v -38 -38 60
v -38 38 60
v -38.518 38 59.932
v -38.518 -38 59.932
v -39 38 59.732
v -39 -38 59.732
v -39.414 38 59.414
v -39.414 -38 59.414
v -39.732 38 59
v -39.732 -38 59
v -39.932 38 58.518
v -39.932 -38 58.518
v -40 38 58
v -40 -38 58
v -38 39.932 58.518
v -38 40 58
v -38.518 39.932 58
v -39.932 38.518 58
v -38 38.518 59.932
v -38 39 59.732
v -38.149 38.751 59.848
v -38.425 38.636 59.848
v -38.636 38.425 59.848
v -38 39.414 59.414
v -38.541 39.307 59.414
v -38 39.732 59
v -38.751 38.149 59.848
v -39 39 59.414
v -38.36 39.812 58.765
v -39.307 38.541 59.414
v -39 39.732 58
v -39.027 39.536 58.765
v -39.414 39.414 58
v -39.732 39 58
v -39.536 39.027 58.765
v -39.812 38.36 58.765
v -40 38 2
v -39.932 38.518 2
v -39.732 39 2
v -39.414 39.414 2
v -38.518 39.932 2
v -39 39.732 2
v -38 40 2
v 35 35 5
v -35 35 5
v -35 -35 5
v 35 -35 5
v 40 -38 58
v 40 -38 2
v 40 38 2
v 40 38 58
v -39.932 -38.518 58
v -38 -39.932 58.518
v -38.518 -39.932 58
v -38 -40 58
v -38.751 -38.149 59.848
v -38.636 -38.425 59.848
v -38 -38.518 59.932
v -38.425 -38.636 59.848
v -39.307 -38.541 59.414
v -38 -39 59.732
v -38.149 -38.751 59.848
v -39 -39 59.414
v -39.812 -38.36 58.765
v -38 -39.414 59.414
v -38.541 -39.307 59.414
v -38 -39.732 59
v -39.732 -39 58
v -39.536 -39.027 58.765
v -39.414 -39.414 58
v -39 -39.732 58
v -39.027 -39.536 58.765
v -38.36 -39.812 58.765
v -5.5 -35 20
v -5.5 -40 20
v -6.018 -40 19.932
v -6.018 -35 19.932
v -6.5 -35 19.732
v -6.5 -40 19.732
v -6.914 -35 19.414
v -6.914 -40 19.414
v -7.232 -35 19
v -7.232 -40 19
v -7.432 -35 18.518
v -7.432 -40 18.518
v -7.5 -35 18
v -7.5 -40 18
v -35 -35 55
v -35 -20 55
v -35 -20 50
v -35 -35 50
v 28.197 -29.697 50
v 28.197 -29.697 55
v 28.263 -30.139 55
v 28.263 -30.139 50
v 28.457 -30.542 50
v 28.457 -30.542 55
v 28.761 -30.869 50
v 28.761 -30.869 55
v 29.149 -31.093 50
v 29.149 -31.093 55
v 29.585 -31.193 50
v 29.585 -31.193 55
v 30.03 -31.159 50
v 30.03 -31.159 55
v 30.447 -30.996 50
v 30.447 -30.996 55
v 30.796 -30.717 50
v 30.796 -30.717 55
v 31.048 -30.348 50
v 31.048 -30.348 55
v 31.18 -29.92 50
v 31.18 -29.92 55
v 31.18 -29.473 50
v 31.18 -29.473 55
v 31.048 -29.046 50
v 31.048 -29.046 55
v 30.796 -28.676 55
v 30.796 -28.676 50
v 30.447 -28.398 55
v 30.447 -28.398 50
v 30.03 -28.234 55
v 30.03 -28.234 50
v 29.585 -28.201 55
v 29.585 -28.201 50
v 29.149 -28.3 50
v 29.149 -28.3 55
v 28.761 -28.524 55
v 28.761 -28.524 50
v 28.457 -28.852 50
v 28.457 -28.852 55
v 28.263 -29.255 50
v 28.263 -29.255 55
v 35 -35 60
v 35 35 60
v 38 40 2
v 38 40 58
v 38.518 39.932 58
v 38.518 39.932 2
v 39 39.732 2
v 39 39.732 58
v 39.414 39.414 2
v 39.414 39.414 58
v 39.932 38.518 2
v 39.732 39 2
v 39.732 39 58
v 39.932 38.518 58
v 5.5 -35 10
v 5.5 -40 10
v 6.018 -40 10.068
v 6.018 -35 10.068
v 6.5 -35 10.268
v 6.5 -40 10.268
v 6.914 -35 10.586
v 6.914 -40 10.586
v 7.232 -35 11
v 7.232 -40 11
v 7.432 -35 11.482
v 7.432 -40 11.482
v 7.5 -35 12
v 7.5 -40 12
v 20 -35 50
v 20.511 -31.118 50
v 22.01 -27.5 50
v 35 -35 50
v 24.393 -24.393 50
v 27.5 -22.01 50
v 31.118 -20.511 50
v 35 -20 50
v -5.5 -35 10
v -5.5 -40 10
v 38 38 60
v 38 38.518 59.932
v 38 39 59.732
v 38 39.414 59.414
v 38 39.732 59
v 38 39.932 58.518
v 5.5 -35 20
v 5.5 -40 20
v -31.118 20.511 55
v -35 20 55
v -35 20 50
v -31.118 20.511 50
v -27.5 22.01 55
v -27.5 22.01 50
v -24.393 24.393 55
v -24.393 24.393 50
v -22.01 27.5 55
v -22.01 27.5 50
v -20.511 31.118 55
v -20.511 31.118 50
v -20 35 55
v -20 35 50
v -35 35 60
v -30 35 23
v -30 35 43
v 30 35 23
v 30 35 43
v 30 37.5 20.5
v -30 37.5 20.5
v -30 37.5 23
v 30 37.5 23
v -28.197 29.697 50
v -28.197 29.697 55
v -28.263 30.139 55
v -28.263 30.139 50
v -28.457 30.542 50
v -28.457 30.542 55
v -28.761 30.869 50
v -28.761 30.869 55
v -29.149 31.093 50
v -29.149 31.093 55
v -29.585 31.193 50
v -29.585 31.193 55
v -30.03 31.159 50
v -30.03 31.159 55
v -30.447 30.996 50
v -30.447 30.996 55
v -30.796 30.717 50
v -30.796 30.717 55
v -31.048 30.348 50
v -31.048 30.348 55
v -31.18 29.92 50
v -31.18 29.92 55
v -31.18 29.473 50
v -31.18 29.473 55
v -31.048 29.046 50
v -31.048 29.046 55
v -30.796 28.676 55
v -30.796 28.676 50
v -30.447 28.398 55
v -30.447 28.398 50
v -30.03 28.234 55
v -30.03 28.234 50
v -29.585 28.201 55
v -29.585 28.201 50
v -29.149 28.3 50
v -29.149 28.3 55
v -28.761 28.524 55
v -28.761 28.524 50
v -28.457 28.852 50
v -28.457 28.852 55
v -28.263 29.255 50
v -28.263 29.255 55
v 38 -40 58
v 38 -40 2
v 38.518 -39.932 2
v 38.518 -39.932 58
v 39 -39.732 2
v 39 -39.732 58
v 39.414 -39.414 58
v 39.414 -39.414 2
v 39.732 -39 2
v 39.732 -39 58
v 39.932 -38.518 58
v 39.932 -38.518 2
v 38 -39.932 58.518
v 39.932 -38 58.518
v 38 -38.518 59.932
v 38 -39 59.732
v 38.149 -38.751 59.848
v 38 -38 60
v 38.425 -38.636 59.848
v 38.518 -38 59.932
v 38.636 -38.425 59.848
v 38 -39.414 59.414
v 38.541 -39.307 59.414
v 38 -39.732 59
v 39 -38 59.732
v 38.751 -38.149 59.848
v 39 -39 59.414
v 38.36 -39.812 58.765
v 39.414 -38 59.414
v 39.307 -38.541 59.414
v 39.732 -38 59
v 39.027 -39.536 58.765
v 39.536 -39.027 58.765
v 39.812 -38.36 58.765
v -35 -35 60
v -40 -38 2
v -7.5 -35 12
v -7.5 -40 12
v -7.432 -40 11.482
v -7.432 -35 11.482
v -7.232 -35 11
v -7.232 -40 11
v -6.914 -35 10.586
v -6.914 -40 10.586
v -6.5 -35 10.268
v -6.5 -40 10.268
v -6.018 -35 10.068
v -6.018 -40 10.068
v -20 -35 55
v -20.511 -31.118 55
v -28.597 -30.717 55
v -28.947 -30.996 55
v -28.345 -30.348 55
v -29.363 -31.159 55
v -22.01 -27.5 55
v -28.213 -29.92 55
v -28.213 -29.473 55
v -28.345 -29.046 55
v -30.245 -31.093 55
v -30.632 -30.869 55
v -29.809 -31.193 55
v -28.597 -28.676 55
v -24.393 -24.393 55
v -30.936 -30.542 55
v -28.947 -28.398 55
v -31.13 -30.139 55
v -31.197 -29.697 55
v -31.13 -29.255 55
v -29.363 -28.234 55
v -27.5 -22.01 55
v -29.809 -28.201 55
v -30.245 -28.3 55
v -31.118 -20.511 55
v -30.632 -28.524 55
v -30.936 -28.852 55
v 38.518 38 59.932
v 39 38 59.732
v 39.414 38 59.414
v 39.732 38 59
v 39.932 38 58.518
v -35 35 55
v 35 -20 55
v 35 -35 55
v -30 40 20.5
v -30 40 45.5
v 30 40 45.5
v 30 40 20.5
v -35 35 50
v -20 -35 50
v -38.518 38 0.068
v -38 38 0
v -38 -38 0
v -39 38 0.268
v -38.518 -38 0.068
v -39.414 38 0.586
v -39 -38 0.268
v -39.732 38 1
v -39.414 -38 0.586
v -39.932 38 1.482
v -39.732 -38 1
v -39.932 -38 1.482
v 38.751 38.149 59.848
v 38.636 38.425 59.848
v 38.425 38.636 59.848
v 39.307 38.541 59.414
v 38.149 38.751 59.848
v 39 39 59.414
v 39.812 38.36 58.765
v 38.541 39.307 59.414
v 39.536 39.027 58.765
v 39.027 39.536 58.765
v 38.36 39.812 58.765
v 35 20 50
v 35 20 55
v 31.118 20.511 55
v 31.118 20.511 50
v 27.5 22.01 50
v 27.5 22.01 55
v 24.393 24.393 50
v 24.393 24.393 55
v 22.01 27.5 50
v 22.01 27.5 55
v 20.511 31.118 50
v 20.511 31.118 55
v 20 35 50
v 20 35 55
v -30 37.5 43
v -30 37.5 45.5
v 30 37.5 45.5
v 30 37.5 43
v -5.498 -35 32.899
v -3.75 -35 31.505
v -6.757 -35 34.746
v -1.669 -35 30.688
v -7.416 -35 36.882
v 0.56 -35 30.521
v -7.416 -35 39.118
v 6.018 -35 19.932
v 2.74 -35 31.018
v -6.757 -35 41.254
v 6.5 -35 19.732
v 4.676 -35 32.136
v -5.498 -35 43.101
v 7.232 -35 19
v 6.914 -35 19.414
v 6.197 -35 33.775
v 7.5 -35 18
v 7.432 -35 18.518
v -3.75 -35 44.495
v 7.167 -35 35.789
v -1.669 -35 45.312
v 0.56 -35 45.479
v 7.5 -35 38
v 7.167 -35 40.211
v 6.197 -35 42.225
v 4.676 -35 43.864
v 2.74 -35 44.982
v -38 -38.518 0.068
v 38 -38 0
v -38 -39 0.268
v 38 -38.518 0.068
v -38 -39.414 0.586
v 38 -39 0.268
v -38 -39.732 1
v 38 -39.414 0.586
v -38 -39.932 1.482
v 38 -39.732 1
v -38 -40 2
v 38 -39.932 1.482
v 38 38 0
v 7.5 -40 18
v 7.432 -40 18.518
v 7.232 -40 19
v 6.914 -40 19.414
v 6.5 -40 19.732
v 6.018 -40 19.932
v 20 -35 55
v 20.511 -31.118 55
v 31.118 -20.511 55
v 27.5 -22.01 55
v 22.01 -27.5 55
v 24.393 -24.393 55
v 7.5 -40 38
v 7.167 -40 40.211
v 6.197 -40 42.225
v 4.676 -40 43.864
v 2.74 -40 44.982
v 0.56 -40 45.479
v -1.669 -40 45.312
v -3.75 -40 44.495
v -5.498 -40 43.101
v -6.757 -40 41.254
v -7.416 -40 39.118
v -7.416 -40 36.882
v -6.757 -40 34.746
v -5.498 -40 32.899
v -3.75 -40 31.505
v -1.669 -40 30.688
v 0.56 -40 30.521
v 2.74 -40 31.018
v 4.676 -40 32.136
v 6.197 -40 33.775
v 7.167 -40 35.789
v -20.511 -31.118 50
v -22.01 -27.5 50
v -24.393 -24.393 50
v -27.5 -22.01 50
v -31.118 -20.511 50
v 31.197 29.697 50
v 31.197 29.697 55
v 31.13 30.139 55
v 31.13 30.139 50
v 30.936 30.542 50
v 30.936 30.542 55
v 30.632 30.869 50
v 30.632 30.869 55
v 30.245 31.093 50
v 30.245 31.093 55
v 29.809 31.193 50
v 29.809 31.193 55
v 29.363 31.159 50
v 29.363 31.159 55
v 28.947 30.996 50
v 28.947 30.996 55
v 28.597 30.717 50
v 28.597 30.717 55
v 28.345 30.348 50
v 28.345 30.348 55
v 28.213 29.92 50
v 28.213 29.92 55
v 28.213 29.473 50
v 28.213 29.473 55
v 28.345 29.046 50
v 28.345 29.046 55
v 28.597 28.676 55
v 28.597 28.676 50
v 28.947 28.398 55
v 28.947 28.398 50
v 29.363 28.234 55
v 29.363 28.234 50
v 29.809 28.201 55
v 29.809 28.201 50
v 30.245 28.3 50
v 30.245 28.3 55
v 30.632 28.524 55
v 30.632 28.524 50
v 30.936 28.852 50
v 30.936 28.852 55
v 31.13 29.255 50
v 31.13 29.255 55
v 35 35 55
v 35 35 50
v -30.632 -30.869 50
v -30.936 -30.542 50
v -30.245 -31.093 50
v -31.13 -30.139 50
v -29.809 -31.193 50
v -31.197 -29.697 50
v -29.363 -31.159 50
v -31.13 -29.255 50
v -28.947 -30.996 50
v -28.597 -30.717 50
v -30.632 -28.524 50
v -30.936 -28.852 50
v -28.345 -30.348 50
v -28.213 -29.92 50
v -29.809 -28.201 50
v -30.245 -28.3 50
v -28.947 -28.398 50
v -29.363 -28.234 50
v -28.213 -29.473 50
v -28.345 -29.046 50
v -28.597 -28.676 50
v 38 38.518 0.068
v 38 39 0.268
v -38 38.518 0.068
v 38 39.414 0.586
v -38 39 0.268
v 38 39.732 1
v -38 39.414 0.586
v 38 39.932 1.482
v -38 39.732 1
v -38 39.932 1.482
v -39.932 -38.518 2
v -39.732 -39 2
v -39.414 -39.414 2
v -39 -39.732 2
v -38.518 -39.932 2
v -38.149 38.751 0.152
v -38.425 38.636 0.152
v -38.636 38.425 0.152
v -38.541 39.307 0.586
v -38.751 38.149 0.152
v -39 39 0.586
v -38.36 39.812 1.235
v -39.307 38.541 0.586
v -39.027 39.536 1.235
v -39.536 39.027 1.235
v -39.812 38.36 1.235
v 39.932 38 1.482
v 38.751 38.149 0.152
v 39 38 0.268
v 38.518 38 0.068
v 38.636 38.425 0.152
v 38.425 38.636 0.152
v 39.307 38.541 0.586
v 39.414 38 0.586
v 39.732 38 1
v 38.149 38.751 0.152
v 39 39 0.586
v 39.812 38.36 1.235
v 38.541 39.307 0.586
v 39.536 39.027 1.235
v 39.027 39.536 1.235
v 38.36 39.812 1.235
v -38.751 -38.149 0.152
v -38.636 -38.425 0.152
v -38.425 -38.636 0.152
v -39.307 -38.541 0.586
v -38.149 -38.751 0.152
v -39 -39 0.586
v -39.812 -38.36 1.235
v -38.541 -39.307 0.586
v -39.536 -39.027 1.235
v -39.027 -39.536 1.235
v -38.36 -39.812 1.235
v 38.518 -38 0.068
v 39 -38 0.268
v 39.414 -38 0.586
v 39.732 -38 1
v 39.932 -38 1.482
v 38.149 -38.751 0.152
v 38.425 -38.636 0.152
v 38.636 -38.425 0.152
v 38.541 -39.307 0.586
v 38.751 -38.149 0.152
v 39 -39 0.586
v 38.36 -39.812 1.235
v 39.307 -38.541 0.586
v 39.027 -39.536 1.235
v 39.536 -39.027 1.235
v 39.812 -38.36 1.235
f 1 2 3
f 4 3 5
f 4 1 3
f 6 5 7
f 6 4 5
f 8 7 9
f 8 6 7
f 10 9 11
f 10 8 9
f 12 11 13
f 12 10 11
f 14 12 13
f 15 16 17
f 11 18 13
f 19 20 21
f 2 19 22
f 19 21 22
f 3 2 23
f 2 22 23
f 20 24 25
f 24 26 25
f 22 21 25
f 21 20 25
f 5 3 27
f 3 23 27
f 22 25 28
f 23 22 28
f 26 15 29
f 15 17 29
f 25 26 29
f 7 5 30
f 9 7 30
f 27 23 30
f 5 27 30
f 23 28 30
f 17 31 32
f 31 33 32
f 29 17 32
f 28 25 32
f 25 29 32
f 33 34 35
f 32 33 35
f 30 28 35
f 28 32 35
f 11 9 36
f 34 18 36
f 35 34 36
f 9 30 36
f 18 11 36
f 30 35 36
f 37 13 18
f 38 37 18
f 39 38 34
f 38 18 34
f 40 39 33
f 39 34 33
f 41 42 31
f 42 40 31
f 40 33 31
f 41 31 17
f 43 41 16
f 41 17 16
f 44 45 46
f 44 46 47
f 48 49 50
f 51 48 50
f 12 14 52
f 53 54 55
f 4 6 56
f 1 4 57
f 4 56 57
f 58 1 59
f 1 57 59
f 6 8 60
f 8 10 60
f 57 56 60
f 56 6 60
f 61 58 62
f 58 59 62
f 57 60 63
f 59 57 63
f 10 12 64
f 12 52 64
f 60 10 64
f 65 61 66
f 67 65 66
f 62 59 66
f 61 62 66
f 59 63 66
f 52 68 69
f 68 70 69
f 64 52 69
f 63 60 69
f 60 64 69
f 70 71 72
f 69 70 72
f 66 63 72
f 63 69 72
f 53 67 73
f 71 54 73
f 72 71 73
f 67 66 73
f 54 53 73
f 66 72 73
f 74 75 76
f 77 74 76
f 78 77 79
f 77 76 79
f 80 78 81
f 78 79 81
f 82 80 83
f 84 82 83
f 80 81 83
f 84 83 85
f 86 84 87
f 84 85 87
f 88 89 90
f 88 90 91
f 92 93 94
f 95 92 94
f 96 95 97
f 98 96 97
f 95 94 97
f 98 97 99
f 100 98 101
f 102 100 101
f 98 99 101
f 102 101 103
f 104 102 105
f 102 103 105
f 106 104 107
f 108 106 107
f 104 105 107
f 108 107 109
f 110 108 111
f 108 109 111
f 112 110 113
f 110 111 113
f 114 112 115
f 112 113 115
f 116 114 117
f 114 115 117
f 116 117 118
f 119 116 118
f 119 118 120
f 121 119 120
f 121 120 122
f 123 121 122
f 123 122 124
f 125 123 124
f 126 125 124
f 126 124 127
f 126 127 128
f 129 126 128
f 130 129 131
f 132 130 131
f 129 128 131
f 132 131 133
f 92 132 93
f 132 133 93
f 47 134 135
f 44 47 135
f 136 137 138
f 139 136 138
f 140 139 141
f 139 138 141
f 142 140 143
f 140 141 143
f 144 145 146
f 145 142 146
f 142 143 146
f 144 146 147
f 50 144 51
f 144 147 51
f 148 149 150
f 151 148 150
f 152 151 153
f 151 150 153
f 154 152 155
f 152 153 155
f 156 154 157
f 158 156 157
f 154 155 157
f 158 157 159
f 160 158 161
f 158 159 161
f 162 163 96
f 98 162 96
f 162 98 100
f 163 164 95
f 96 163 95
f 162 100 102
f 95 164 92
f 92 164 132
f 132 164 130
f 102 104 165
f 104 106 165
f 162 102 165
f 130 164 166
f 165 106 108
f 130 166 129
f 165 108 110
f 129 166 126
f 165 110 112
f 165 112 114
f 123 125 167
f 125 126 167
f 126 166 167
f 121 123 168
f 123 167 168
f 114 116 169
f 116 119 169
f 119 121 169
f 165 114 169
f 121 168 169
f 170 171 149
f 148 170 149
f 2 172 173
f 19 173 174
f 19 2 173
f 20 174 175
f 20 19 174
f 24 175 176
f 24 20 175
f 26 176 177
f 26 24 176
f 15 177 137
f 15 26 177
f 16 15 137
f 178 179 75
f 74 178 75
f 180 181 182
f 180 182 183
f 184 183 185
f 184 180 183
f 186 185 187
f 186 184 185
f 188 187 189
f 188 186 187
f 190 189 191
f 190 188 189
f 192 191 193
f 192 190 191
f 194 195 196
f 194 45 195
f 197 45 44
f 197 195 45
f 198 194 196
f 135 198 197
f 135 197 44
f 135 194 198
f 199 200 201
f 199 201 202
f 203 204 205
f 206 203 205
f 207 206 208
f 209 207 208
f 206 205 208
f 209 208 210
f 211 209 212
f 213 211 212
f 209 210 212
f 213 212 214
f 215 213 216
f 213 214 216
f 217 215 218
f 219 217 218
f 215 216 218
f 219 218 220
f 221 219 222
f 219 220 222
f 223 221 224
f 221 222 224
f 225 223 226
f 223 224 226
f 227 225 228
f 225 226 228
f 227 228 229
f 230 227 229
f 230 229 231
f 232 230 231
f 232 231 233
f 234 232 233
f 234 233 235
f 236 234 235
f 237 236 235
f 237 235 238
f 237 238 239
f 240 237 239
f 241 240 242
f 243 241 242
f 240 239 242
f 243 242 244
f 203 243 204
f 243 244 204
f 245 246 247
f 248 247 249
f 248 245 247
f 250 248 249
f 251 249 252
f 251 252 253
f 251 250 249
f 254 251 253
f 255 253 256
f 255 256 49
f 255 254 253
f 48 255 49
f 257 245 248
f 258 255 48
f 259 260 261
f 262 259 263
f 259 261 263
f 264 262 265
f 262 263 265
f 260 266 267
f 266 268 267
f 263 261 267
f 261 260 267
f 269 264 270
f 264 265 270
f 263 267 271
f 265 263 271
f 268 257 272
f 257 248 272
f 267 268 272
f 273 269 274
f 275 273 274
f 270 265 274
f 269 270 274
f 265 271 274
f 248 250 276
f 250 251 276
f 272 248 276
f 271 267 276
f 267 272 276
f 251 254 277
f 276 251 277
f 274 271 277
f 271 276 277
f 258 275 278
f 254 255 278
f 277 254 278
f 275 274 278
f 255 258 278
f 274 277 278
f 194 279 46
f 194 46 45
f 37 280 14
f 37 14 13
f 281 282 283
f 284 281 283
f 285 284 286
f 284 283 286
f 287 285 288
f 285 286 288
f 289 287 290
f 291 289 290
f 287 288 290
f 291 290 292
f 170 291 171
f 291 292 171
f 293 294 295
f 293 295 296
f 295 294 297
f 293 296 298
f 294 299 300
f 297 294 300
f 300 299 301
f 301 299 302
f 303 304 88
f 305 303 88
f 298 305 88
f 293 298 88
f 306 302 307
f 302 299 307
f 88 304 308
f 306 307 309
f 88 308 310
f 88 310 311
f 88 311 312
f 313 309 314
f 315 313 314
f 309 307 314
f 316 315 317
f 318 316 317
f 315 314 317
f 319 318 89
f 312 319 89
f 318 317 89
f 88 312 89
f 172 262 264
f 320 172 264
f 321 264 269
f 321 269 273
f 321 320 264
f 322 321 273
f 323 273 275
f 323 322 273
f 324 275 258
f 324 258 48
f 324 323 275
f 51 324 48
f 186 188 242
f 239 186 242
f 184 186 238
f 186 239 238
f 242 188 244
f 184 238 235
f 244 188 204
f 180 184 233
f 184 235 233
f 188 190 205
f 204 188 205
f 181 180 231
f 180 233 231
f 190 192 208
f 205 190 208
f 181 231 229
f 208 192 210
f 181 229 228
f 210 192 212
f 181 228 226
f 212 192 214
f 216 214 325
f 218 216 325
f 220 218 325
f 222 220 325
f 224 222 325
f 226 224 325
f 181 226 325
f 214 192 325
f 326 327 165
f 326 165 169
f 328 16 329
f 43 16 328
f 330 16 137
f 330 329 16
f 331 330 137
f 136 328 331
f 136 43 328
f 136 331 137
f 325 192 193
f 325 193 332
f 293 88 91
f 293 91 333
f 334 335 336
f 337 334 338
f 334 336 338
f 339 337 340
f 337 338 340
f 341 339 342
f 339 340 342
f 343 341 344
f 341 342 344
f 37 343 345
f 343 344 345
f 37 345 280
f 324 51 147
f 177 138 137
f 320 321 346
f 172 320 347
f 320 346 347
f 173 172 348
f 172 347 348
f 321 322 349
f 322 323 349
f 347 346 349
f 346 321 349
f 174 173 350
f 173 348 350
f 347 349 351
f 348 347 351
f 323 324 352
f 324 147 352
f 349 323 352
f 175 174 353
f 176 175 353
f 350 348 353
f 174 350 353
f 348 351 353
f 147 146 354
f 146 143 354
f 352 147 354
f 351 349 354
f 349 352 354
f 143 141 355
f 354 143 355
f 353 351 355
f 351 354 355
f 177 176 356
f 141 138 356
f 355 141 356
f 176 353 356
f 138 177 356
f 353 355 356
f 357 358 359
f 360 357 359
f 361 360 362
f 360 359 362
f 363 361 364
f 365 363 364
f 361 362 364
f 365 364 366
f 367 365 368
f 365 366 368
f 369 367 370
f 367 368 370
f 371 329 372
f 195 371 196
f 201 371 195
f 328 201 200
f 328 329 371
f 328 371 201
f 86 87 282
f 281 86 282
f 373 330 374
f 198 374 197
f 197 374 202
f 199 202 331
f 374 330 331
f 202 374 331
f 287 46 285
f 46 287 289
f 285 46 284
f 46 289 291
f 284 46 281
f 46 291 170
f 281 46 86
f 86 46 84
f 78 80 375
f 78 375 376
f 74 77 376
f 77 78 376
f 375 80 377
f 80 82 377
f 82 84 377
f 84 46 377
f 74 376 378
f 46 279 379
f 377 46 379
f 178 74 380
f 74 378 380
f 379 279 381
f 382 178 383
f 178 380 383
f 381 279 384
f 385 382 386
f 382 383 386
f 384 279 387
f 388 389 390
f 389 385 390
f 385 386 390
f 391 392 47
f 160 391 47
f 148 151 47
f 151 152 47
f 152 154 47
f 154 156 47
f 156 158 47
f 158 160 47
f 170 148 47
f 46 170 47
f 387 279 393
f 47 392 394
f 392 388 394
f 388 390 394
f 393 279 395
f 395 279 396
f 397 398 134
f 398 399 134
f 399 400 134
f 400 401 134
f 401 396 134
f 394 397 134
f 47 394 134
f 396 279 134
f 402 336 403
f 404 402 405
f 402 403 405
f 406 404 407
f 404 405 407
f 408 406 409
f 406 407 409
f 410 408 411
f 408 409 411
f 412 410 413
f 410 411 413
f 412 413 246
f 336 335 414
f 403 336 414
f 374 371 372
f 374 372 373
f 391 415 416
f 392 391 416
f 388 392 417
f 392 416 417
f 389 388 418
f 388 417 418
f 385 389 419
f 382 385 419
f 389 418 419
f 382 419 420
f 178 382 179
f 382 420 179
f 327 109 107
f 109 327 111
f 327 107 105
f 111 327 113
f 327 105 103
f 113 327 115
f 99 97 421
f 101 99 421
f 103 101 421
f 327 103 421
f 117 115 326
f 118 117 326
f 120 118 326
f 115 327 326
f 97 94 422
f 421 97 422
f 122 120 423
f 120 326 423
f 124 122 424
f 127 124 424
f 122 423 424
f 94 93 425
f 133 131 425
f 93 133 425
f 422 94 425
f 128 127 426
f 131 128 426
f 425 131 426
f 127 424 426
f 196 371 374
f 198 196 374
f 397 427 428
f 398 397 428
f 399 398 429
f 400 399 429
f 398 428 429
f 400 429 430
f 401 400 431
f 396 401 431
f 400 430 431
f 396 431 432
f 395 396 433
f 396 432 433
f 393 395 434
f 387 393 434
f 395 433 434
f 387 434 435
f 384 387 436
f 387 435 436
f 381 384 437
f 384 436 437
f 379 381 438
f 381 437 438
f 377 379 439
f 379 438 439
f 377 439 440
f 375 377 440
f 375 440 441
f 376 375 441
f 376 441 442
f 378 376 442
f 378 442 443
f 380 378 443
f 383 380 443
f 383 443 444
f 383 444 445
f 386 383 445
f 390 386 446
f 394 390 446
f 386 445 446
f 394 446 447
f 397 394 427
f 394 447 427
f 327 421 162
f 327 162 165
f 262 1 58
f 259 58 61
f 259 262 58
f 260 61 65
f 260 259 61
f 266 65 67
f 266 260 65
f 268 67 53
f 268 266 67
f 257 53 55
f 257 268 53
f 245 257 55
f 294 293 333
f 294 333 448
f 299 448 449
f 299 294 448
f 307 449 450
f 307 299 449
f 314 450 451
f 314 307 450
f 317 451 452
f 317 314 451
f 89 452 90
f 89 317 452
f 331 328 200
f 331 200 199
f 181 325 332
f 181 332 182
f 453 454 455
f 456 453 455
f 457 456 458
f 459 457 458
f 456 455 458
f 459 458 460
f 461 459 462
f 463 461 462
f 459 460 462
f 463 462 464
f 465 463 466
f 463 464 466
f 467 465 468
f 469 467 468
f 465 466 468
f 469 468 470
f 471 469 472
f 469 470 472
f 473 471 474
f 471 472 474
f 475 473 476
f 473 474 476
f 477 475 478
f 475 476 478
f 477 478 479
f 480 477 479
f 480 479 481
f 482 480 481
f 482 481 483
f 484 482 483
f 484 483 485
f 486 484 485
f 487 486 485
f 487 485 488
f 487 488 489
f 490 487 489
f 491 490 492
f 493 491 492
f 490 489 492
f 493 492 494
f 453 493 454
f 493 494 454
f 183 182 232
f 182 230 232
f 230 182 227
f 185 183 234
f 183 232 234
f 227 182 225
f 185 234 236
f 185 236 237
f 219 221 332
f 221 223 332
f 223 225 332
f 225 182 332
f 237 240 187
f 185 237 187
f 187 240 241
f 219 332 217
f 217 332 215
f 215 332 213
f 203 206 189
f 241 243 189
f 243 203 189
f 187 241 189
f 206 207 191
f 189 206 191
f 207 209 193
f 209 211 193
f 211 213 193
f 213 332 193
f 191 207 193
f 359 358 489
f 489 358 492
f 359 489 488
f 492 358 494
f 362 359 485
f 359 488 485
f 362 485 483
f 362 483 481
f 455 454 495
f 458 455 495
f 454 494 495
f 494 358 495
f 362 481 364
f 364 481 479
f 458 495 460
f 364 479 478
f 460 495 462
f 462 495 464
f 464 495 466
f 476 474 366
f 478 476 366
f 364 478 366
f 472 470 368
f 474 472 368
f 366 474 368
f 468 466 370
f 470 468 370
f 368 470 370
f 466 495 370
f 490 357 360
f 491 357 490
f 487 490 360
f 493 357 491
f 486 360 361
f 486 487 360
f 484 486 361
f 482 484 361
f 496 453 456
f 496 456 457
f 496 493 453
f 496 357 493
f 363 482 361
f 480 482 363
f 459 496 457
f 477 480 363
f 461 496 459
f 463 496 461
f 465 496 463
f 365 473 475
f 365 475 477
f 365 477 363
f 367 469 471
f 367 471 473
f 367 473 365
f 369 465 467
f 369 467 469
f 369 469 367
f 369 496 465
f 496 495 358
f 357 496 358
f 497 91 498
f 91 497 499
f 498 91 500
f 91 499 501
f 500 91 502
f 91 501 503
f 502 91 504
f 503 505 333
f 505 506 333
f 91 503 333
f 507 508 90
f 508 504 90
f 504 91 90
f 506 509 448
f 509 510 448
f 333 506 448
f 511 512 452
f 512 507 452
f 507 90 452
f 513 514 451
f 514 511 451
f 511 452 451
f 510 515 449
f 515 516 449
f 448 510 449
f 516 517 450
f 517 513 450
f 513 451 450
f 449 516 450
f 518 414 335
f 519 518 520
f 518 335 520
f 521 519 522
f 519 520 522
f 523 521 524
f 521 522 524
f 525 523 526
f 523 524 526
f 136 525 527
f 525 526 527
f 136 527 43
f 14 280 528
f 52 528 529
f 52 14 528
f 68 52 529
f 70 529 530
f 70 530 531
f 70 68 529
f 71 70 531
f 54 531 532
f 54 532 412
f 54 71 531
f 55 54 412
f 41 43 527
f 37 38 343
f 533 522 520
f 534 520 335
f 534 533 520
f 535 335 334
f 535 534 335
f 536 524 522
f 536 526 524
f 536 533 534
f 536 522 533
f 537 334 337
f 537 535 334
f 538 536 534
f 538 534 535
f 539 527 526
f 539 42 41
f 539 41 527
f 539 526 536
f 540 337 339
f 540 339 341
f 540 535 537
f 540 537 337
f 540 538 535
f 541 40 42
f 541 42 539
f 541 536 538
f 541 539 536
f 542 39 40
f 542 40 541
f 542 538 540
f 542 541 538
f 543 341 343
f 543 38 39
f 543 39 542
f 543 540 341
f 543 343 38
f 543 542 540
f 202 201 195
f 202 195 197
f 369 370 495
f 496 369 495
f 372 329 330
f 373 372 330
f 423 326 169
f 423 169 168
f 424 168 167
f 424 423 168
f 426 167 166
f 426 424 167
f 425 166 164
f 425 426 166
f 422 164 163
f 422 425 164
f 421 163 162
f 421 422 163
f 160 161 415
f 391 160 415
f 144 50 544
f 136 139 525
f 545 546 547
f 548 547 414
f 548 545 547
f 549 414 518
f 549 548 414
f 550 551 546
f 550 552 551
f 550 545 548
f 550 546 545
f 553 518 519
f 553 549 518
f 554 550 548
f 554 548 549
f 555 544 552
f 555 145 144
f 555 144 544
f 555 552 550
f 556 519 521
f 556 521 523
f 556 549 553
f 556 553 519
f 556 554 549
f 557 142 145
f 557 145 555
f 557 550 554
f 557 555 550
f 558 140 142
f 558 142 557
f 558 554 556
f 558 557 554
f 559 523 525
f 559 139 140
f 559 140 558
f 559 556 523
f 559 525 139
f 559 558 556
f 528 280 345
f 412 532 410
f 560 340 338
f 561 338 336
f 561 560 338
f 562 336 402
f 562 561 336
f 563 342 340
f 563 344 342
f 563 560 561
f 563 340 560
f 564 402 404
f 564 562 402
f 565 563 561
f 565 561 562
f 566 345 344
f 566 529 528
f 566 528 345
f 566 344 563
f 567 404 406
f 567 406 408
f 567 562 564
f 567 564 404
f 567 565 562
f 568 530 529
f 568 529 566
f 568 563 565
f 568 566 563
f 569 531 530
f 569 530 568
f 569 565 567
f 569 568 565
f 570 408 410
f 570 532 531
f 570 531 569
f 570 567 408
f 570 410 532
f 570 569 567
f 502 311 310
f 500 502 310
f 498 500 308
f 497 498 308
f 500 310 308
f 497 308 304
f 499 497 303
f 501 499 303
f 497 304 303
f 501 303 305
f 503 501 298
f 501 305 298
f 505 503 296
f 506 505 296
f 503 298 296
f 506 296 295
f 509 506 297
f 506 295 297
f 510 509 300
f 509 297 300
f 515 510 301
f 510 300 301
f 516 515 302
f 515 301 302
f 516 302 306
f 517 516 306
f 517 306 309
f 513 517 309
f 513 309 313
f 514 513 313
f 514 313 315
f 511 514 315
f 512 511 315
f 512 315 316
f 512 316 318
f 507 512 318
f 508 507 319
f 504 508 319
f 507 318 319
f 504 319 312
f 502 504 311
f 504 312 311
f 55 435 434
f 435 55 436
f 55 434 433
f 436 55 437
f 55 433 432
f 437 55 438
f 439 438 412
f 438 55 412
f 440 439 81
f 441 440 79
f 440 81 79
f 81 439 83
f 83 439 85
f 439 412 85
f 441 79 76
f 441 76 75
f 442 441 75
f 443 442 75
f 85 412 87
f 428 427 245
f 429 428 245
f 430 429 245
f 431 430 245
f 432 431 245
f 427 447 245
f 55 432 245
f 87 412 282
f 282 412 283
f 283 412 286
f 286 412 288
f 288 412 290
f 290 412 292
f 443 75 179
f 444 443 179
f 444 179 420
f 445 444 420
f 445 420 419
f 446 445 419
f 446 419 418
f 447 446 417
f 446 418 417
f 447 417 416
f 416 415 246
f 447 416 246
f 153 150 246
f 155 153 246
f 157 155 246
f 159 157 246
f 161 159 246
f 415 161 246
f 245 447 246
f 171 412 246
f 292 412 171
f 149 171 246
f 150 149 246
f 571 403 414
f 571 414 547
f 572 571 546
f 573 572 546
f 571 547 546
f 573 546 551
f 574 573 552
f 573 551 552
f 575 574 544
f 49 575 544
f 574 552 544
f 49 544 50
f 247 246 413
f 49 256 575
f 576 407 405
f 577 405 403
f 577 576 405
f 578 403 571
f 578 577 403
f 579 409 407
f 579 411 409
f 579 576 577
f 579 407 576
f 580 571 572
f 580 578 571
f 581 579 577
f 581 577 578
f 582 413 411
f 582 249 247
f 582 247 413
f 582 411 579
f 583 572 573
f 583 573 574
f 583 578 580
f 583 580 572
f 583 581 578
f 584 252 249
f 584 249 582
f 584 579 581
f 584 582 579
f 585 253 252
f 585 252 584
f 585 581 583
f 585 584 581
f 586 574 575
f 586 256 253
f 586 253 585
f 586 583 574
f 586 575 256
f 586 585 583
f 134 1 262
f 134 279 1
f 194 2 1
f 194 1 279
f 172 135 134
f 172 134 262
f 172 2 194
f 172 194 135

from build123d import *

# Parameters (mm, degrees)
SKETCH_1_W          = 80
SKETCH_1_H          = 80
EXTRUDE_2_DEPTH     = 60
SKETCH_2_W          = 70
SKETCH_2_H          = 70
CUT_EXTRUDE_1_DEPTH = 55
EXTRUDE_3_DEPTH     = 10
EXTRUDE_3_2_DEPTH   = 10
EXTRUDE_3_3_DEPTH   = 10
EXTRUDE_3_4_DEPTH   = 10
CUT_EXTRUDE_2_DEPTH = 5
SKETCH_6_R          = 1.5
CUT_EXTRUDE_3_DEPTH = 5
CUT_EXTRUDE_4_DEPTH = 5
FILLET_1_R          = 2
FILLET_2_R          = 2
FILLET_3_R          = 2
FILLET_4_R          = 2
SKETCH_10_R         = 7.5
CUT_EXTRUDE_5_DEPTH = 5
SKETCH_11_W         = 60
SKETCH_11_H         = 20
CUT_EXTRUDE_6_DEPTH = 5
SKETCH_12_W         = 60
SKETCH_12_H         = 2.5
CUT_EXTRUDE_9_DEPTH = 2.5


with BuildPart() as part:
    # Эскиз1 → Бобышка-Вытянуть2 (new body)
    with BuildSketch(Plane.XY):
        Rectangle(SKETCH_1_W, SKETCH_1_H)
    extrude(amount=EXTRUDE_2_DEPTH)

    # Эскиз2 → Вырез-Вытянуть1 (cut)
    with BuildSketch(Plane.XY.offset(60)):
        Rectangle(SKETCH_2_W, SKETCH_2_H)
    extrude(amount=-CUT_EXTRUDE_1_DEPTH, mode=Mode.SUBTRACT)

    # Эскиз7 → Вырез-Вытянуть4 (cut)
    with BuildSketch(Plane.XZ.offset(40)):
        with BuildLine():
            Line((5.5, 20), (-5.5, 20))
            ThreePointArc((-5.5, 20), (-6.914213562, 19.414213562), (-7.5, 18))
            Line((-7.5, 18), (-7.5, 12))
            ThreePointArc((-7.5, 12), (-6.914213562, 10.585786438), (-5.5, 10))
            Line((-5.5, 10), (5.5, 10))
            ThreePointArc((5.5, 10), (6.914213562, 10.585786438), (7.5, 12))
            Line((7.5, 12), (7.5, 18))
            ThreePointArc((7.5, 18), (6.914213562, 19.414213562), (5.5, 20))
        make_face()
    extrude(amount=-CUT_EXTRUDE_4_DEPTH, mode=Mode.SUBTRACT)

    # Скругление1
    fillet_1_edges = [part.edges().sort_by_distance(p)[0] for p in [
        (40, -40, 30),
        (-40, -40, 30),
    ]]
    fillet(fillet_1_edges, radius=FILLET_1_R)

    # Скругление2
    fillet_2_edges = [part.edges().sort_by_distance(p)[0] for p in [
        (-40, 40, 30),
        (40, 40, 30),
    ]]
    fillet(fillet_2_edges, radius=FILLET_2_R)

    # Скругление3
    fillet_3_edges = [part.edges().sort_by_distance(p)[0] for p in [
        (40, 0, 60),
        (0, -40, 60),
        (-39.414213562, -39.414213562, 60),
        (39.414213562, -39.414213562, 60),
        (-40, 0, 60),
        (0, 40, 60),
        (39.414213562, 39.414213562, 60),
        (-39.414213562, 39.414213562, 60),
    ]]
    fillet(fillet_3_edges, radius=FILLET_3_R)

    # Скругление4
    fillet_4_edges = [part.edges().sort_by_distance(p)[0] for p in [
        (40, 0, 0),
        (0, -40, 0),
        (-39.414213562, -39.414213562, 0),
        (39.414213562, -39.414213562, 0),
        (-40, 0, 0),
        (0, 40, 0),
        (39.414213562, 39.414213562, 0),
        (-39.414213562, 39.414213562, 0),
    ]]
    fillet(fillet_4_edges, radius=FILLET_4_R)

    # Эскиз10 → Вырез-Вытянуть5 (cut)
    with BuildSketch(Plane.XZ.offset(40)):
        with Locations((0, 38)):
            Circle(SKETCH_10_R)
    extrude(amount=-CUT_EXTRUDE_5_DEPTH, mode=Mode.SUBTRACT)

    # Эскиз11 → Вырез-Вытянуть6 (cut)
    with BuildSketch(Plane(origin=(0, 40, 0), x_dir=(1, 0, 0), z_dir=(0, 1, 0))):
        with Locations((0, -33)):
            Rectangle(SKETCH_11_W, SKETCH_11_H)
    extrude(amount=-CUT_EXTRUDE_6_DEPTH, mode=Mode.SUBTRACT)

    # Эскиз12 → Вырез-Вытянуть9 (cut)
    with BuildSketch(Plane(origin=(0, 40, 0), x_dir=(1, 0, 0), z_dir=(0, 1, 0))):
        with Locations((0, -21.75)):
            Rectangle(SKETCH_12_W, SKETCH_12_H)
        with Locations((0, -44.25)):
            Rectangle(SKETCH_12_W, SKETCH_12_H)
    extrude(amount=-CUT_EXTRUDE_9_DEPTH, mode=Mode.SUBTRACT)


with BuildPart() as body_2:
    # Эскиз3 → Бобышка-Вытянуть3 (new body)
    with BuildSketch(Plane.XY.offset(60)):
        with BuildLine():
            Line((-35, 35), (-35, 20))
            ThreePointArc((-35, 20), (-24.393398282, 24.393398282), (-20, 35))
            Line((-20, 35), (-35, 35))
        make_face()
    extrude(amount=-EXTRUDE_3_DEPTH)


with BuildPart() as body_3:
    # Эскиз3 → Extrude 3 2 (new body)
    with BuildSketch(Plane.XY.offset(60)):
        with BuildLine():
            Line((35, 35), (35, 20))
            ThreePointArc((35, 20), (24.393398282, 24.393398282), (20, 35))
            Line((20, 35), (35, 35))
        make_face()
    extrude(amount=-EXTRUDE_3_2_DEPTH)


with BuildPart() as body_4:
    # Эскиз3 → Extrude 3 3 (new body)
    with BuildSketch(Plane.XY.offset(60)):
        with BuildLine():
            Line((20, -35), (35, -35))
            Line((35, -35), (35, -20))
            ThreePointArc((35, -20), (24.393398282, -24.393398282), (20, -35))
        make_face()
    extrude(amount=-EXTRUDE_3_3_DEPTH)


with BuildPart() as body_5:
    # Эскиз3 → Extrude 3 4 (new body)
    with BuildSketch(Plane.XY.offset(60)):
        with BuildLine():
            Line((-35, -20), (-35, -35))
            Line((-35, -35), (-20, -35))
            ThreePointArc((-20, -35), (-24.393398282, -24.393398282), (-35, -20))
        make_face()
    extrude(amount=-EXTRUDE_3_4_DEPTH)


with BuildPart() as cut_extrude_2_tool:
    # Эскиз5 → Вырез-Вытянуть2 (new body)
    with BuildSketch(Plane.XY.offset(60)):
        with BuildLine():
            Line((-35, 35), (-20, 35))
            ThreePointArc((-20, 35), (-24.393398282, 24.393398282), (-35, 20))
            Line((-35, 20), (-35, 35))
        make_face()
        with BuildLine():
            Line((35, 35), (35, 20))
            ThreePointArc((35, 20), (24.393398282, 24.393398282), (20, 35))
            Line((20, 35), (35, 35))
        make_face()
        with BuildLine():
            Line((35, -20), (35, -35))
            Line((35, -35), (20, -35))
            ThreePointArc((20, -35), (24.393398282, -24.393398282), (35, -20))
        make_face()
        with BuildLine():
            Line((-20, -35), (-35, -35))
            Line((-35, -35), (-35, -20))
            ThreePointArc((-35, -20), (-24.393398282, -24.393398282), (-20, -35))
        make_face()
    extrude(amount=-CUT_EXTRUDE_2_DEPTH)


with BuildPart() as body_2_1:
    add(body_2.part)

    # Вырез-Вытянуть2: cut by cut_extrude_2_tool
    add(cut_extrude_2_tool.part, mode=Mode.SUBTRACT)


with BuildPart() as body_3_1:
    add(body_3.part)

    # Вырез-Вытянуть2: cut by cut_extrude_2_tool
    add(cut_extrude_2_tool.part, mode=Mode.SUBTRACT)


with BuildPart() as body_4_1:
    add(body_4.part)

    # Вырез-Вытянуть2: cut by cut_extrude_2_tool
    add(cut_extrude_2_tool.part, mode=Mode.SUBTRACT)


with BuildPart() as body_5_1:
    add(body_5.part)

    # Вырез-Вытянуть2: cut by cut_extrude_2_tool
    add(cut_extrude_2_tool.part, mode=Mode.SUBTRACT)


with BuildPart() as cut_extrude_3_tool:
    # Эскиз6 → Вырез-Вытянуть3 (new body)
    with BuildSketch(Plane.XY.offset(55)):
        with Locations((-29.696699141, 29.696699141)):
            Circle(SKETCH_6_R)
        with Locations((29.696699141, 29.696699141)):
            Circle(SKETCH_6_R)
        with Locations(Location((29.696699141, -29.696699141, 0), (0, 0, 180))):
            Circle(SKETCH_6_R)
        with Locations(Location((-29.696699141, -29.696699141, 0), (0, 0, 180))):
            Circle(SKETCH_6_R)
    extrude(amount=-CUT_EXTRUDE_3_DEPTH)


with BuildPart() as body_2_2:
    add(body_2_1.part)

    # Вырез-Вытянуть3: cut by cut_extrude_3_tool
    add(cut_extrude_3_tool.part, mode=Mode.SUBTRACT)


with BuildPart() as body_3_2:
    add(body_3_1.part)

    # Вырез-Вытянуть3: cut by cut_extrude_3_tool
    add(cut_extrude_3_tool.part, mode=Mode.SUBTRACT)


with BuildPart() as body_4_2:
    add(body_4_1.part)

    # Вырез-Вытянуть3: cut by cut_extrude_3_tool
    add(cut_extrude_3_tool.part, mode=Mode.SUBTRACT)


with BuildPart() as body_5_2:
    add(body_5_1.part)

    # Вырез-Вытянуть3: cut by cut_extrude_3_tool
    add(cut_extrude_3_tool.part, mode=Mode.SUBTRACT)


solid = Compound([part.part, body_2_2.part, body_3_2.part, body_4_2.part, body_5_2.part])
